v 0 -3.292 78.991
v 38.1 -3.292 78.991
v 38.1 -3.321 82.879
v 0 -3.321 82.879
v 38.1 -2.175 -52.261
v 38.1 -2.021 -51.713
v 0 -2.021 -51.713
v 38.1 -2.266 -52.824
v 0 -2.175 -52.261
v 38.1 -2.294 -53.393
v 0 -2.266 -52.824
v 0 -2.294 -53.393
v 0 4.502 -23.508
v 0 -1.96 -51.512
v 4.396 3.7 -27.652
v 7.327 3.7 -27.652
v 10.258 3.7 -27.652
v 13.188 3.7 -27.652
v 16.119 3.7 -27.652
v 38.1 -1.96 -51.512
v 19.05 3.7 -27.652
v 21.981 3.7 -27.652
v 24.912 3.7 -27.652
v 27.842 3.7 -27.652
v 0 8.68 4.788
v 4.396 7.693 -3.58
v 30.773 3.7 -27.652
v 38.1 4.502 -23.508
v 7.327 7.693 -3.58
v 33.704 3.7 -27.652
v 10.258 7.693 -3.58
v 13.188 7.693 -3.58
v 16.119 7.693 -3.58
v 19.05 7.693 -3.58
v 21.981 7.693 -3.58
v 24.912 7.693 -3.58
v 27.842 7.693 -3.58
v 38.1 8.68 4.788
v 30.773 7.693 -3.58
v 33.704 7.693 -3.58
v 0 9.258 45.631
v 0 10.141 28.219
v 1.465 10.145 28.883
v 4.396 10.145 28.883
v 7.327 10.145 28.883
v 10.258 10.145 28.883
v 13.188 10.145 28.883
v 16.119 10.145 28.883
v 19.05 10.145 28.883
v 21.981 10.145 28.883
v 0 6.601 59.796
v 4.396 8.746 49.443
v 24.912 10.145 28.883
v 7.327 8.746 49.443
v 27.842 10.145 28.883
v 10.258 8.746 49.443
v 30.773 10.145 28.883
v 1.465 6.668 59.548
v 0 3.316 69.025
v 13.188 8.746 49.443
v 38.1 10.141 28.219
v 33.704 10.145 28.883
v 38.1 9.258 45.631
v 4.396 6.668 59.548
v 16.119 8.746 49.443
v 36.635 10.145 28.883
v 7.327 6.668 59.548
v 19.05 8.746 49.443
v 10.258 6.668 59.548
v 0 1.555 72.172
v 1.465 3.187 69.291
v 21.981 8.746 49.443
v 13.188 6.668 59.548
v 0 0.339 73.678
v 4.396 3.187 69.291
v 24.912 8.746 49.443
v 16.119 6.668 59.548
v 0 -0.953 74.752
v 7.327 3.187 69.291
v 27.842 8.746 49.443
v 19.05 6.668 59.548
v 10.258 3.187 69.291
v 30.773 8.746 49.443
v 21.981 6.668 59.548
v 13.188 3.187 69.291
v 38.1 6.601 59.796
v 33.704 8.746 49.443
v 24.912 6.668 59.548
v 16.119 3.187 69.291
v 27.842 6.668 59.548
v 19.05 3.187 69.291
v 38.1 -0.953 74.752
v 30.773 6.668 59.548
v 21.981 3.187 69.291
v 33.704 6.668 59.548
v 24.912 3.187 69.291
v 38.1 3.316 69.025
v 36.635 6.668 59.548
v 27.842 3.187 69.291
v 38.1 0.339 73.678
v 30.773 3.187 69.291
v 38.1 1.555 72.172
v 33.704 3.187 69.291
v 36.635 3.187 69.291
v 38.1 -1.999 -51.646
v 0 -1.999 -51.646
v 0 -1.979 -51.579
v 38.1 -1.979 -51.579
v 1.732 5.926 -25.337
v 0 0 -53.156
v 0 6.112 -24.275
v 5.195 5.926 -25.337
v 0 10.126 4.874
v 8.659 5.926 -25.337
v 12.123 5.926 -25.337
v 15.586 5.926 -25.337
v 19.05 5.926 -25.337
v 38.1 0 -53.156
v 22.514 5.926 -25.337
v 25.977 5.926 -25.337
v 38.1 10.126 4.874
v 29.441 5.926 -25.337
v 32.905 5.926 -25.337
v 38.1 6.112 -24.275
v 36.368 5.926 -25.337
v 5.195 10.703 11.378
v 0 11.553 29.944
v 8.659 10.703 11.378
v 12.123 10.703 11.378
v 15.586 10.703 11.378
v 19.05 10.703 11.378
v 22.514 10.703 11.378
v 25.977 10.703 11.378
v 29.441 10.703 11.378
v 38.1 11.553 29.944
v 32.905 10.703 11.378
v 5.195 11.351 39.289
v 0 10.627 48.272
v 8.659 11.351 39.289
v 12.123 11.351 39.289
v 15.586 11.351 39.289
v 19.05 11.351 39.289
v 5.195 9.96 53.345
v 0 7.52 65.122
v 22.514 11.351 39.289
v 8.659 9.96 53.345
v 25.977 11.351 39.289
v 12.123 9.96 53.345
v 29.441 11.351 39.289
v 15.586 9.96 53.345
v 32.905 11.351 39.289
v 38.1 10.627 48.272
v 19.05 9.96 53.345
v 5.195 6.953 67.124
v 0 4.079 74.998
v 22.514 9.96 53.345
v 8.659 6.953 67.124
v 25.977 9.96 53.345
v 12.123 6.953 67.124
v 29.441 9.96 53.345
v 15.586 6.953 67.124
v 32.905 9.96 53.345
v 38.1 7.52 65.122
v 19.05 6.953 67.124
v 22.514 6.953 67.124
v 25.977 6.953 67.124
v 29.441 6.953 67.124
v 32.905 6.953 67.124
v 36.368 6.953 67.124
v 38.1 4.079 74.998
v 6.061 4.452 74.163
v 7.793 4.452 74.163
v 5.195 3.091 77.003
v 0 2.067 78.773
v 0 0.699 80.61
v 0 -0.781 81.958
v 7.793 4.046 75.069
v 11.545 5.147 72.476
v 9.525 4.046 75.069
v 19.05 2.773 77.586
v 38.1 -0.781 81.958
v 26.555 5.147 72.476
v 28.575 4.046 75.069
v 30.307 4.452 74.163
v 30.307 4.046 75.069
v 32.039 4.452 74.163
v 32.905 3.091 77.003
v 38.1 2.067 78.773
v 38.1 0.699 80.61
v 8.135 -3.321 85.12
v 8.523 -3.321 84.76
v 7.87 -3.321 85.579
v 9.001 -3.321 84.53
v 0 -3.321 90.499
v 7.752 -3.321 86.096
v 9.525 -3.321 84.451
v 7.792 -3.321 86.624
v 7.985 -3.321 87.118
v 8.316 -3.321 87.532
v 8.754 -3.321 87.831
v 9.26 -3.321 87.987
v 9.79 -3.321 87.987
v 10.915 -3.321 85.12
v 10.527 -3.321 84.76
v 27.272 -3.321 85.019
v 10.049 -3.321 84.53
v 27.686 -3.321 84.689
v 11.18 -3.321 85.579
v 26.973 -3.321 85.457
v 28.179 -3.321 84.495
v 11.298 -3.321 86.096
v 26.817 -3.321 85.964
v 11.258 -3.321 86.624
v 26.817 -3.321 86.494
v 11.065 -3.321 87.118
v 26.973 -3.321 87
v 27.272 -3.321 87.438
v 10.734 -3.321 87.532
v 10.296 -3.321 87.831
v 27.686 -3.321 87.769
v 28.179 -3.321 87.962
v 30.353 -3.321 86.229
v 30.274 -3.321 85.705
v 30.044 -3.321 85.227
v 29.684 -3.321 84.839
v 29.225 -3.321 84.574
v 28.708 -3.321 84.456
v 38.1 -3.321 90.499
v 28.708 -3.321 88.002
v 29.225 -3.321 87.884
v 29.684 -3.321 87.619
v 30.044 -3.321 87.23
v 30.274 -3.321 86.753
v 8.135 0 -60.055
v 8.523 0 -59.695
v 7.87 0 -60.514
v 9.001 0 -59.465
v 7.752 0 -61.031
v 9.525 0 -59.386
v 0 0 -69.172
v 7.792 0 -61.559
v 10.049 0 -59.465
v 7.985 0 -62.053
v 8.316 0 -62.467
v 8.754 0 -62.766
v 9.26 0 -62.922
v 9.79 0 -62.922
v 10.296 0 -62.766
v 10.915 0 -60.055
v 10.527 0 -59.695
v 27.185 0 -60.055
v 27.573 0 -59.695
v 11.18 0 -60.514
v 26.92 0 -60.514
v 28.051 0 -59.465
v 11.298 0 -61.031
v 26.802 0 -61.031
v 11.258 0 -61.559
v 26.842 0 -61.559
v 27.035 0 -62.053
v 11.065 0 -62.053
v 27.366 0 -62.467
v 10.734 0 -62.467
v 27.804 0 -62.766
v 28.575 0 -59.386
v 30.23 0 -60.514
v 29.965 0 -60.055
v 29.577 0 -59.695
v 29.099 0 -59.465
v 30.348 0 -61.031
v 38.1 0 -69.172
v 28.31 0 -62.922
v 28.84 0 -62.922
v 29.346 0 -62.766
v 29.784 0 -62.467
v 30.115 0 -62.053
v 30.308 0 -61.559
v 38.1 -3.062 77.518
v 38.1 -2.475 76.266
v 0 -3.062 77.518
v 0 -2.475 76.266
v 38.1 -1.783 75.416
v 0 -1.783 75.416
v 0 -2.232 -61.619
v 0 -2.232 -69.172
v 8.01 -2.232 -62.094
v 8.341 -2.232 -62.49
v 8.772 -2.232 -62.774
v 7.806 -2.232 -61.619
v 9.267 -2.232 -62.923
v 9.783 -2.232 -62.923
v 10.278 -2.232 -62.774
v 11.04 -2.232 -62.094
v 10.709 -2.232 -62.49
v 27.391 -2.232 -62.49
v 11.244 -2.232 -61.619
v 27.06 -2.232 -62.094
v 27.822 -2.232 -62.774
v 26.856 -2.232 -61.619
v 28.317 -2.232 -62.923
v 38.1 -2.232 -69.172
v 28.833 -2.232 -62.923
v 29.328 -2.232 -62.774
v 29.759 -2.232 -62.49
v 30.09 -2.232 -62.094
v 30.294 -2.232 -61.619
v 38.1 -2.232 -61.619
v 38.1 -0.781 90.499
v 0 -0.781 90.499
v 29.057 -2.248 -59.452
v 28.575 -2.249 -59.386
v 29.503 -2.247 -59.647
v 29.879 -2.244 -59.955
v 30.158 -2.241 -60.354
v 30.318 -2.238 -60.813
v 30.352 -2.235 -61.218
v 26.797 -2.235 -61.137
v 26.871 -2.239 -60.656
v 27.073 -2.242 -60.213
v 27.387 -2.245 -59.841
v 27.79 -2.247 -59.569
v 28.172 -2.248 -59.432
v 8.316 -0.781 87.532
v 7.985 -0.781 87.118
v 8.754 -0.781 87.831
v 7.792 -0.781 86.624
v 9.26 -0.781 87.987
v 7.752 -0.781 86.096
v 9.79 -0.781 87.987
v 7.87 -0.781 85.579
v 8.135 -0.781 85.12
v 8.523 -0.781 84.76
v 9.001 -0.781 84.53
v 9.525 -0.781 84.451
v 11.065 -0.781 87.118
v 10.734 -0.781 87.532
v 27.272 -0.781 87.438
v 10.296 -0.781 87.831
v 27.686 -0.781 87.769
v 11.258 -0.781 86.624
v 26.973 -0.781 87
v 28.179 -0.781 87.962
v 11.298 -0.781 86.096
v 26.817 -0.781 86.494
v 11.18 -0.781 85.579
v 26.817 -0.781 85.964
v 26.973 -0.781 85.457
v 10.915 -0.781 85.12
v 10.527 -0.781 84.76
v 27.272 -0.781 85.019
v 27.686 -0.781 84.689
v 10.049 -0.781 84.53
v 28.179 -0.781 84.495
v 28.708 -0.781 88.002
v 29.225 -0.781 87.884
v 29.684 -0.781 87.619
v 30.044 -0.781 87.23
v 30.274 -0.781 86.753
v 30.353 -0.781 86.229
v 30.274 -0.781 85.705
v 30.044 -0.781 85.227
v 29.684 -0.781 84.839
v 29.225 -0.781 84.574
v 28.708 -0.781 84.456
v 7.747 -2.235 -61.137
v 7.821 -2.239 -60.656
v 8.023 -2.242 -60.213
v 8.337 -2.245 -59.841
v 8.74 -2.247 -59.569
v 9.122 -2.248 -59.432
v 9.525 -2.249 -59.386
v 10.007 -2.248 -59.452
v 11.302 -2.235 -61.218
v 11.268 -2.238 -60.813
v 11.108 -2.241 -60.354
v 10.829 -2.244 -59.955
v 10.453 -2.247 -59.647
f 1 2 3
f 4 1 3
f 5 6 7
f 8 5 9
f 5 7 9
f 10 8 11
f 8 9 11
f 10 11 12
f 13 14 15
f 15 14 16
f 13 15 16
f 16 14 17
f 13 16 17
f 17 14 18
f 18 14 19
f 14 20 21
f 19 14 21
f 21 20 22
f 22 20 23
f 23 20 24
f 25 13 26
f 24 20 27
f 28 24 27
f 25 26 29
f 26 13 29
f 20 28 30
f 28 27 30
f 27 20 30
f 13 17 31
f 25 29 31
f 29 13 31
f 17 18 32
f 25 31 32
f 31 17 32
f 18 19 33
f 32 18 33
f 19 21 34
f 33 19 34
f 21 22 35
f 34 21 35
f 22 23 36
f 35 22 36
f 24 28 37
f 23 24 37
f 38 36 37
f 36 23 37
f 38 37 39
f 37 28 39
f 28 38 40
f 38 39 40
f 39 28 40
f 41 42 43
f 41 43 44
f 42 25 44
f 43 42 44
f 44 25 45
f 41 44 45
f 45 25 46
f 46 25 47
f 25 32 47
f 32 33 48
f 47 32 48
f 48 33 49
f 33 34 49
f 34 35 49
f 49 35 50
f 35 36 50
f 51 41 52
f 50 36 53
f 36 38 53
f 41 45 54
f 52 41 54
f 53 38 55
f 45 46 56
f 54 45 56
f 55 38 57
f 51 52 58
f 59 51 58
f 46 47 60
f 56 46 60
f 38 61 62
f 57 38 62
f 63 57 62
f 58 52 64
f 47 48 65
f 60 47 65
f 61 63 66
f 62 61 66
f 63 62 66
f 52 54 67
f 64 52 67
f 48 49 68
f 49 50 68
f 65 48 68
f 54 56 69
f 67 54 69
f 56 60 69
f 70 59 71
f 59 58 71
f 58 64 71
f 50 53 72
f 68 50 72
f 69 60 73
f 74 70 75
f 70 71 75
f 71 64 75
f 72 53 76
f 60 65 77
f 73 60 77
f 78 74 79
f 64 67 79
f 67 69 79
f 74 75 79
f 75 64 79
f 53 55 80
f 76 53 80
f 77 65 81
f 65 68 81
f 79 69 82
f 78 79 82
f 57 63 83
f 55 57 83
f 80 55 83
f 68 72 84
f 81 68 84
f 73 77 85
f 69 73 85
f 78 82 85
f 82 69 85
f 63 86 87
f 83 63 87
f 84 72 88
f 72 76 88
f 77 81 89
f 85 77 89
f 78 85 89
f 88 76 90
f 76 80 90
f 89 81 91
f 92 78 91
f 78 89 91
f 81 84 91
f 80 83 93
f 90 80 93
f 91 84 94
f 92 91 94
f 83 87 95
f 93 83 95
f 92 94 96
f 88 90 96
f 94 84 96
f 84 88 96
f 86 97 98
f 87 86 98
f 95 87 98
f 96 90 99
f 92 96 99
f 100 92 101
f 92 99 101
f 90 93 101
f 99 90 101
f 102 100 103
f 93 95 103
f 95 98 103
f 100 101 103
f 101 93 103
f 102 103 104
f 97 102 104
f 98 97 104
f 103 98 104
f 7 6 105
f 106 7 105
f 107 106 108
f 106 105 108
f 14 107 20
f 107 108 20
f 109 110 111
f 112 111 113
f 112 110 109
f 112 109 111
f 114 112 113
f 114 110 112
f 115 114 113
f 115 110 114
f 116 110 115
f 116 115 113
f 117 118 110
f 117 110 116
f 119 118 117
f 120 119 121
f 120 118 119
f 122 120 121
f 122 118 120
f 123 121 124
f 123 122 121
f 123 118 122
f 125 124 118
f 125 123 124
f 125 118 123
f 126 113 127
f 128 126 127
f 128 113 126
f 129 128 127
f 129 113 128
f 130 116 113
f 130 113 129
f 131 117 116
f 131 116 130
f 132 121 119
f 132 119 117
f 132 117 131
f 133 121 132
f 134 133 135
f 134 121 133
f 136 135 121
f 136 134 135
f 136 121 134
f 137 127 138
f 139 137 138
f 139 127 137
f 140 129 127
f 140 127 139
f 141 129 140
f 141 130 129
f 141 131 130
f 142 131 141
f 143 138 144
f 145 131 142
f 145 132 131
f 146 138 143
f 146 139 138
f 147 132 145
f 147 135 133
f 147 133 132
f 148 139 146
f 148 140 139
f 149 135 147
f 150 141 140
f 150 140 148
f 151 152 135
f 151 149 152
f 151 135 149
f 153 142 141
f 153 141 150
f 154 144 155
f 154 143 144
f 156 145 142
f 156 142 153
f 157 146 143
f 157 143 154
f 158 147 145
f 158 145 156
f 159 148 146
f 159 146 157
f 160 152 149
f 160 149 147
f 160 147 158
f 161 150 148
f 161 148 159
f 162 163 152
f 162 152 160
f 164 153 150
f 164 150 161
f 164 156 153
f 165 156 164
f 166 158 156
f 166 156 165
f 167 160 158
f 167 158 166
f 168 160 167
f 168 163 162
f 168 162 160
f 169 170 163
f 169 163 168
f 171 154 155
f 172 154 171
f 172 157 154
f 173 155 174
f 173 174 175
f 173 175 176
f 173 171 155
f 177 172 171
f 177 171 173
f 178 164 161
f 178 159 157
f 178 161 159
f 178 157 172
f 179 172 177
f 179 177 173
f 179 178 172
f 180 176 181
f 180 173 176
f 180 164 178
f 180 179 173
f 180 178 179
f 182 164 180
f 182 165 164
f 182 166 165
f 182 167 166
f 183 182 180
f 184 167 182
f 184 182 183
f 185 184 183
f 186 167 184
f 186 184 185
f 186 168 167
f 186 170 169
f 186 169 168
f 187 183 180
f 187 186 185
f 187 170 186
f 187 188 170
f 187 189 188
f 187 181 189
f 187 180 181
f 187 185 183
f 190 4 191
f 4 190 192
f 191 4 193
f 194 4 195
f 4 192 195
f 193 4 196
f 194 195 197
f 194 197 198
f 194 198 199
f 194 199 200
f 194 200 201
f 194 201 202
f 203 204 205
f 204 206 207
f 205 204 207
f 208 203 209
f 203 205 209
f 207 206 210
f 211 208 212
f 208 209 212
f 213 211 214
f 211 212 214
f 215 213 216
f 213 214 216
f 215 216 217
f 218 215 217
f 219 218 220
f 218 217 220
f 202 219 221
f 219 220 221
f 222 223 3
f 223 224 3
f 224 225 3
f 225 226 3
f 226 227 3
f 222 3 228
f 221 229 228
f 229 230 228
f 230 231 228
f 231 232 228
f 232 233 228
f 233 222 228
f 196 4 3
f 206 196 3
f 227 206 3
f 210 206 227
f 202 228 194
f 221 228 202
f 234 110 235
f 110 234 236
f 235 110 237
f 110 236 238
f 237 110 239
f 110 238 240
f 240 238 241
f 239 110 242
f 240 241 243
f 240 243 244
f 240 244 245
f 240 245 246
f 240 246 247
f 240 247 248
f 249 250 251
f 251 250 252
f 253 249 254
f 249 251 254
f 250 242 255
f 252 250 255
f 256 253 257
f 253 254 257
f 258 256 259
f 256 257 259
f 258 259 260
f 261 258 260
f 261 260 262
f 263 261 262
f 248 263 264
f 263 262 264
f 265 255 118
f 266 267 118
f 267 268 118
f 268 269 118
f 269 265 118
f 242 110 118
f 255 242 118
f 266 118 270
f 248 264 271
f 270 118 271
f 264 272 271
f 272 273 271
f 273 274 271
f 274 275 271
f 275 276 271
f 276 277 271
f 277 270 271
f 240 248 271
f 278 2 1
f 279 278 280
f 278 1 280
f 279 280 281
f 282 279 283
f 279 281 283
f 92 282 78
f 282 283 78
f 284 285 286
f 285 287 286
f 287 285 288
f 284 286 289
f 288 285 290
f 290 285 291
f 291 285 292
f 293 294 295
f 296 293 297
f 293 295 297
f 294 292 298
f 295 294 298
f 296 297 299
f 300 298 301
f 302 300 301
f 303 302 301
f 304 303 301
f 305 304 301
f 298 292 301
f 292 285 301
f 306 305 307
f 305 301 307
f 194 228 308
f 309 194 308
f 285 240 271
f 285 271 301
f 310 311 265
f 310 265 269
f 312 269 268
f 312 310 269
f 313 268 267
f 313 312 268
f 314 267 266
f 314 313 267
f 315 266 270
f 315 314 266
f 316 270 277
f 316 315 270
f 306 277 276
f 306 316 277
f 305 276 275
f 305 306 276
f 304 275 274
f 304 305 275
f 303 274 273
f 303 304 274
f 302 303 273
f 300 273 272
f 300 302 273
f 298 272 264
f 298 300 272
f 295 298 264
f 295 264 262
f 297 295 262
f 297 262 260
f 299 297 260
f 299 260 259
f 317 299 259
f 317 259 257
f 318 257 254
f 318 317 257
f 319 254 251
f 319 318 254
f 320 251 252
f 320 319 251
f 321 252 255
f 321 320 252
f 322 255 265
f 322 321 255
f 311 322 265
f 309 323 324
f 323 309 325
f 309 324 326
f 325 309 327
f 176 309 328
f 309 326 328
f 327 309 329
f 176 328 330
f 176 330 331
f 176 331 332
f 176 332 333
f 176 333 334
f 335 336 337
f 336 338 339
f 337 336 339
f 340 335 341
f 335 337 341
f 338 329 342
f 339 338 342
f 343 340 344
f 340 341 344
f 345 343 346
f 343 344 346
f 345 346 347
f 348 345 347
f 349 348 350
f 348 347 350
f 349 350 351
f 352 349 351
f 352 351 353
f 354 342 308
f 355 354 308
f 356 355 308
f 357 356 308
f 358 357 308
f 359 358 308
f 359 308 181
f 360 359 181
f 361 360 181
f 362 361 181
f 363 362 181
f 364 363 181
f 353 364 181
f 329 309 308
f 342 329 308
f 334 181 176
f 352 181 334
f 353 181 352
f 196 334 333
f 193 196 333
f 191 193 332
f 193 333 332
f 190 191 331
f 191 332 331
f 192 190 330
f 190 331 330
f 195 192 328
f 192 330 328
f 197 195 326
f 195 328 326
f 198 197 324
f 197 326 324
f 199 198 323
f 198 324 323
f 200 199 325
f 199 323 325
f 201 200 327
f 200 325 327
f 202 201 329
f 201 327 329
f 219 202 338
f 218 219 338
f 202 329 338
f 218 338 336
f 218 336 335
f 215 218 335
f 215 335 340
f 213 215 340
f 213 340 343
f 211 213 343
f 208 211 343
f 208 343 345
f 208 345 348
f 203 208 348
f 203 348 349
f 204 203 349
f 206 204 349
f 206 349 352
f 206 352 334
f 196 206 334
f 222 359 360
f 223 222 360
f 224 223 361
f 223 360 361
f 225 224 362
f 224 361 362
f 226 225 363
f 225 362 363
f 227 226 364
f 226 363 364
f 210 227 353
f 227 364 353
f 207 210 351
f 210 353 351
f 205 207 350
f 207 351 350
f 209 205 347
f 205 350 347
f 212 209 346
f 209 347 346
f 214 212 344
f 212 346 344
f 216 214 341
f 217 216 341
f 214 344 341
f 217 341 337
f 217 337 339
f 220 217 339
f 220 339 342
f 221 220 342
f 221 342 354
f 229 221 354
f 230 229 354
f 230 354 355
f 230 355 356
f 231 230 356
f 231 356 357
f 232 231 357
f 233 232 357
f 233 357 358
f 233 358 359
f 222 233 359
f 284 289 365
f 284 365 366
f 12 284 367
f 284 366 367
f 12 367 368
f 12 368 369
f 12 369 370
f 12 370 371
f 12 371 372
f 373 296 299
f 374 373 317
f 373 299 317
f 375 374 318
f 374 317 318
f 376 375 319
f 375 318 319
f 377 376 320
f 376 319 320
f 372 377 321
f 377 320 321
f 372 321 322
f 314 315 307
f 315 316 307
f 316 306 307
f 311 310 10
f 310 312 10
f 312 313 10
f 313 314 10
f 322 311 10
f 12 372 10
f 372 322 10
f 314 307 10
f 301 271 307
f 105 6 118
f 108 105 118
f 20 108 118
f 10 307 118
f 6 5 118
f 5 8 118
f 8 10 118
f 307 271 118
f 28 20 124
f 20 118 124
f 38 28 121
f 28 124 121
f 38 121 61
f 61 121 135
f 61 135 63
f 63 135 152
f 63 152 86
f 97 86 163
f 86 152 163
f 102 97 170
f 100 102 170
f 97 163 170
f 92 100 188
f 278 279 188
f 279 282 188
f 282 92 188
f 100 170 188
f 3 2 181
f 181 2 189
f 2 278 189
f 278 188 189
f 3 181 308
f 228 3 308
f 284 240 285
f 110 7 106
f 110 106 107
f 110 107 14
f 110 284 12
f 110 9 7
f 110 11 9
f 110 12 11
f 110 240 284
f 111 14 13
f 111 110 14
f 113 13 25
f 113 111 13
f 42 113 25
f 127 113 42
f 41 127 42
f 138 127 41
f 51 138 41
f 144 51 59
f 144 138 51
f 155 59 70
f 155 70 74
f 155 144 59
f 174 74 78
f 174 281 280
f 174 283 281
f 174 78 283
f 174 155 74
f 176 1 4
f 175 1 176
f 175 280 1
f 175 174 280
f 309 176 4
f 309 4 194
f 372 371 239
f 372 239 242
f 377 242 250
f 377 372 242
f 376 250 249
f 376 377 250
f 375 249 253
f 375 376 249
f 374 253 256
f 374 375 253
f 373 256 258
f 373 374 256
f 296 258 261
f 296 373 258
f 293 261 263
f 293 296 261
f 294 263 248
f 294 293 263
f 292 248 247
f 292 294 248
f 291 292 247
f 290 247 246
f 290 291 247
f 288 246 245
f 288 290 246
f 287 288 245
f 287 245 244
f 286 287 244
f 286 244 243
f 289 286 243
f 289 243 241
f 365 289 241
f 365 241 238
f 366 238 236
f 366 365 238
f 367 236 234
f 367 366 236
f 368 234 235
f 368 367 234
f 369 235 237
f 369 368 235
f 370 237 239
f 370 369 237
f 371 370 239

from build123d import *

# Parameters (mm, degrees)
BOSS_EXTRUDE1_DEPTH     = 38.1
SKETCH3_R               = 1.778
CUT_EXTRUDE1_DEPTH      = 38.1
CUT_EXTRUDE3_DEPTH      = 11.938
CUT_EXTRUDE3_DEPTH_BACK = 28.448
SKETCH4_R               = 1.778
BODY_MOVE_COPY1_ANGLE   = 180
FILLET1_R               = 5.08
FILLET2_R               = 5.08


with BuildPart() as part:
    # Sketch2 → Boss-Extrude1 (new body)
    with BuildSketch(Plane(origin=(0, 0, 0), x_dir=(0, 0, -1), z_dir=(1, 0, 0))):
        with BuildLine():
            Line((61.551687437, -3.321105161), (69.171687437, -3.321105161))
            Line((69.171687437, -3.321105161), (69.171687437, -0.781105161))
            Line((69.171687437, -0.781105161), (60.630976158, -0.781105161))
            add(Edge.make_bspline(
                [(-74.483124949, 0), (-74.29506702, 0.047278952), (-74.10698747, 0.094388678), (-70.904571083, 0.893531227), (-67.885219866, 1.606315794), (-61.837800978, 2.963660005), (-58.809532664, 3.606649181), (-52.743665837, 4.819598746), (-49.706033948, 5.389297888), (-43.622383657, 6.463053748), (-40.576470595, 6.967934975), (-34.476736535, 7.915800889), (-31.422723589, 8.357283165), (-22.245838635, 9.56552735), (-16.107570019, 10.211777803), (-3.79150253, 11.194869773), (2.387371081, 11.523299152), (11.712928825, 11.567860245), (14.83108155, 11.507311348), (19.526735057, 11.272277451), (21.09736044, 11.169754089), (24.233480366, 10.913630723), (25.796978104, 10.760219025), (28.914435137, 10.400395235), (30.468402117, 10.194025854), (33.566409835, 9.726131888), (35.110422635, 9.464452072), (39.7241769, 8.577816768), (42.774697618, 7.846061144), (47.306875011, 6.506143704), (48.811872451, 6.022443493), (51.760401832, 4.929089412), (53.207463955, 4.319622251), (55.32547656, 3.284052789), (56.022148657, 2.917322209), (57.045964203, 2.318308681), (57.384595606, 2.110148), (58.046935353, 1.675696382), (58.369940132, 1.448090073), (58.991074857, 0.961253421), (59.289298742, 0.702142505), (59.859060755, 0.149994367), (60.130661436, -0.142782581), (60.465730526, -0.558869775), (60.549947208, -0.668774479), (60.630976158, -0.781105161)],
                knots=[0.029299917, 0.029299917, 0.029299917, 0.029299917, 0.03125, 0.03125, 0.0625, 0.0625, 0.09375, 0.09375, 0.125, 0.125, 0.15625, 0.15625, 0.1875, 0.1875, 0.25, 0.25, 0.3125, 0.3125, 0.34375, 0.34375, 0.359375, 0.359375, 0.375, 0.375, 0.390625, 0.390625, 0.40625, 0.40625, 0.4375, 0.4375, 0.453125, 0.453125, 0.46875, 0.46875, 0.4765625, 0.4765625, 0.48046875, 0.48046875, 0.484375, 0.484375, 0.48828125, 0.48828125, 0.4921875, 0.4921875, 0.493552461, 0.493552461, 0.493552461, 0.493552461], degree=3))
            Line((-74.483124949, 0), (-90.499178662, 0))
            Line((-90.499178662, 0), (-90.499178662, -2.231815001))
            Line((-90.499178662, -2.231815001), (-82.946942991, -2.231815001))
            Line((-82.946942991, -2.231815001), (-73.650183958, -2.301897798))
            ThreePointArc((-73.650183958, -2.301897798), (-73.256112799, -2.103727422), (-72.839144435, -1.959849143))
            add(Edge.make_bspline(
                [(-72.839144435, -1.959849143), (-71.519290177, -1.601063172), (-70.199210435, -1.244042105), (-67.557002621, -0.546032536), (-66.234731433, -0.206164224), (-62.264239138, 0.784646761), (-59.612821841, 1.410572396), (-54.302332968, 2.602512538), (-51.643085198, 3.167147951), (-46.316396426, 4.232289177), (-43.648926114, 4.732565578), (-38.306620945, 5.675475048), (-35.631878593, 6.118832154), (-30.275449601, 6.951192452), (-27.593594404, 7.338876315), (-19.534991827, 8.399885551), (-14.144724046, 8.967384827), (-3.32947533, 9.830678583), (2.096449378, 10.119086016), (10.285607687, 10.158216956), (13.023786679, 10.105046463), (17.147234411, 9.898653467), (18.52646558, 9.808623459), (21.280422314, 9.583710928), (22.653394403, 9.448993765), (25.390962478, 9.1330176), (26.755565214, 8.951796103), (29.476054041, 8.540919041), (30.831915599, 8.311127162), (34.883444217, 7.532535997), (37.562232743, 6.88995109), (41.542125332, 5.713314117), (42.863725887, 5.288556937), (45.452951599, 4.328437457), (46.723676753, 3.793239112), (48.583591302, 2.883862698), (49.195367911, 2.561821393), (50.094422725, 2.035802816), (50.391788978, 1.853008305), (50.973416929, 1.471498355), (51.257060798, 1.271627832), (51.802504913, 0.844116414), (52.064387652, 0.616580392), (52.564719262, 0.131716255), (52.803223064, -0.125383304), (53.239315406, -0.66692069), (53.439034885, -0.953227075), (53.77549654, -1.567845752), (53.908977144, -1.889194183), (54.024229, -2.404662563), (54.047066399, -2.577492013), (54.056805302, -2.922141279), (54.04379582, -3.096126776), (54.011875168, -3.264266952)],
                knots=[0, 0, 0, 0, 0.015625, 0.015625, 0.03125, 0.03125, 0.0625, 0.0625, 0.09375, 0.09375, 0.125, 0.125, 0.15625, 0.15625, 0.1875, 0.1875, 0.25, 0.25, 0.3125, 0.3125, 0.34375, 0.34375, 0.359375, 0.359375, 0.375, 0.375, 0.390625, 0.390625, 0.40625, 0.40625, 0.4375, 0.4375, 0.453125, 0.453125, 0.46875, 0.46875, 0.4765625, 0.4765625, 0.48046875, 0.48046875, 0.484375, 0.484375, 0.48828125, 0.48828125, 0.4921875, 0.4921875, 0.49609375, 0.49609375, 0.5, 0.5, 0.501953125, 0.501953125, 0.503868919, 0.503868919, 0.503868919, 0.503868919], degree=3))
            Line((54.011875168, -3.264266952), (61.551687437, -3.321105161))
        make_face()
    extrude(amount=BOSS_EXTRUDE1_DEPTH)

    # Sketch3 → Cut-Extrude1 (cut)
    with BuildSketch(Plane(origin=(0, -0.781105161, 0), x_dir=(1, 0, 0), z_dir=(0, 1, 0))):
        with BuildLine():
            ThreePointArc((11.303, 64.901331798), (9.525, 66.679331798), (7.747, 64.901331798))
            Line((7.747, 64.901331798), (11.303, 64.901331798))
        make_face()
        with BuildLine():
            Line((11.303, 64.901331798), (7.747, 64.901331798))
            ThreePointArc((7.747, 64.901331798), (9.525, 63.123331798), (11.303, 64.901331798))
        make_face()
        with Locations(Location((28.575, 64.901331798, 0), (0, 0, 270))):
            Circle(SKETCH3_R)
    extrude(amount=-CUT_EXTRUDE1_DEPTH, mode=Mode.SUBTRACT)

    # Sketch4 → Cut-Extrude3 (cut, two sides: drawn at the far end of the back side and taken through both)
    with BuildSketch(Plane(origin=(0, -0.781105161, 0), x_dir=(1, 0, 0), z_dir=(0, 1, 0)).offset(-CUT_EXTRUDE3_DEPTH_BACK)):
        with Locations(Location((9.525, -82.491151805, 0), (0, 0, 90))):
            Circle(SKETCH4_R)
        with Locations(Location((28.575, -82.491151805, 0), (0, 0, 90))):
            Circle(SKETCH4_R)
    extrude(amount=CUT_EXTRUDE3_DEPTH + CUT_EXTRUDE3_DEPTH_BACK, mode=Mode.SUBTRACT)


with BuildPart() as part_1:
    # Body-Move/Copy1: moved
    add(part.part.rotate(Axis((19.05, 0, 10.663745612), (0, 1, 0)), BODY_MOVE_COPY1_ANGLE))

    # Fillet1
    fillet1_edges = [part_1.edges().sort_by_distance(p)[0] for p in [
        (19.05, -3.264266952, 75.339366393),
    ]]
    fillet(fillet1_edges, radius=FILLET1_R)

    # Fillet2
    fillet2_edges = [part_1.edges().sort_by_distance(p)[0] for p in [
        (19.05, -2.301897798, -52.322692734),
    ]]
    fillet(fillet2_edges, radius=FILLET2_R)


solid = part_1.part
